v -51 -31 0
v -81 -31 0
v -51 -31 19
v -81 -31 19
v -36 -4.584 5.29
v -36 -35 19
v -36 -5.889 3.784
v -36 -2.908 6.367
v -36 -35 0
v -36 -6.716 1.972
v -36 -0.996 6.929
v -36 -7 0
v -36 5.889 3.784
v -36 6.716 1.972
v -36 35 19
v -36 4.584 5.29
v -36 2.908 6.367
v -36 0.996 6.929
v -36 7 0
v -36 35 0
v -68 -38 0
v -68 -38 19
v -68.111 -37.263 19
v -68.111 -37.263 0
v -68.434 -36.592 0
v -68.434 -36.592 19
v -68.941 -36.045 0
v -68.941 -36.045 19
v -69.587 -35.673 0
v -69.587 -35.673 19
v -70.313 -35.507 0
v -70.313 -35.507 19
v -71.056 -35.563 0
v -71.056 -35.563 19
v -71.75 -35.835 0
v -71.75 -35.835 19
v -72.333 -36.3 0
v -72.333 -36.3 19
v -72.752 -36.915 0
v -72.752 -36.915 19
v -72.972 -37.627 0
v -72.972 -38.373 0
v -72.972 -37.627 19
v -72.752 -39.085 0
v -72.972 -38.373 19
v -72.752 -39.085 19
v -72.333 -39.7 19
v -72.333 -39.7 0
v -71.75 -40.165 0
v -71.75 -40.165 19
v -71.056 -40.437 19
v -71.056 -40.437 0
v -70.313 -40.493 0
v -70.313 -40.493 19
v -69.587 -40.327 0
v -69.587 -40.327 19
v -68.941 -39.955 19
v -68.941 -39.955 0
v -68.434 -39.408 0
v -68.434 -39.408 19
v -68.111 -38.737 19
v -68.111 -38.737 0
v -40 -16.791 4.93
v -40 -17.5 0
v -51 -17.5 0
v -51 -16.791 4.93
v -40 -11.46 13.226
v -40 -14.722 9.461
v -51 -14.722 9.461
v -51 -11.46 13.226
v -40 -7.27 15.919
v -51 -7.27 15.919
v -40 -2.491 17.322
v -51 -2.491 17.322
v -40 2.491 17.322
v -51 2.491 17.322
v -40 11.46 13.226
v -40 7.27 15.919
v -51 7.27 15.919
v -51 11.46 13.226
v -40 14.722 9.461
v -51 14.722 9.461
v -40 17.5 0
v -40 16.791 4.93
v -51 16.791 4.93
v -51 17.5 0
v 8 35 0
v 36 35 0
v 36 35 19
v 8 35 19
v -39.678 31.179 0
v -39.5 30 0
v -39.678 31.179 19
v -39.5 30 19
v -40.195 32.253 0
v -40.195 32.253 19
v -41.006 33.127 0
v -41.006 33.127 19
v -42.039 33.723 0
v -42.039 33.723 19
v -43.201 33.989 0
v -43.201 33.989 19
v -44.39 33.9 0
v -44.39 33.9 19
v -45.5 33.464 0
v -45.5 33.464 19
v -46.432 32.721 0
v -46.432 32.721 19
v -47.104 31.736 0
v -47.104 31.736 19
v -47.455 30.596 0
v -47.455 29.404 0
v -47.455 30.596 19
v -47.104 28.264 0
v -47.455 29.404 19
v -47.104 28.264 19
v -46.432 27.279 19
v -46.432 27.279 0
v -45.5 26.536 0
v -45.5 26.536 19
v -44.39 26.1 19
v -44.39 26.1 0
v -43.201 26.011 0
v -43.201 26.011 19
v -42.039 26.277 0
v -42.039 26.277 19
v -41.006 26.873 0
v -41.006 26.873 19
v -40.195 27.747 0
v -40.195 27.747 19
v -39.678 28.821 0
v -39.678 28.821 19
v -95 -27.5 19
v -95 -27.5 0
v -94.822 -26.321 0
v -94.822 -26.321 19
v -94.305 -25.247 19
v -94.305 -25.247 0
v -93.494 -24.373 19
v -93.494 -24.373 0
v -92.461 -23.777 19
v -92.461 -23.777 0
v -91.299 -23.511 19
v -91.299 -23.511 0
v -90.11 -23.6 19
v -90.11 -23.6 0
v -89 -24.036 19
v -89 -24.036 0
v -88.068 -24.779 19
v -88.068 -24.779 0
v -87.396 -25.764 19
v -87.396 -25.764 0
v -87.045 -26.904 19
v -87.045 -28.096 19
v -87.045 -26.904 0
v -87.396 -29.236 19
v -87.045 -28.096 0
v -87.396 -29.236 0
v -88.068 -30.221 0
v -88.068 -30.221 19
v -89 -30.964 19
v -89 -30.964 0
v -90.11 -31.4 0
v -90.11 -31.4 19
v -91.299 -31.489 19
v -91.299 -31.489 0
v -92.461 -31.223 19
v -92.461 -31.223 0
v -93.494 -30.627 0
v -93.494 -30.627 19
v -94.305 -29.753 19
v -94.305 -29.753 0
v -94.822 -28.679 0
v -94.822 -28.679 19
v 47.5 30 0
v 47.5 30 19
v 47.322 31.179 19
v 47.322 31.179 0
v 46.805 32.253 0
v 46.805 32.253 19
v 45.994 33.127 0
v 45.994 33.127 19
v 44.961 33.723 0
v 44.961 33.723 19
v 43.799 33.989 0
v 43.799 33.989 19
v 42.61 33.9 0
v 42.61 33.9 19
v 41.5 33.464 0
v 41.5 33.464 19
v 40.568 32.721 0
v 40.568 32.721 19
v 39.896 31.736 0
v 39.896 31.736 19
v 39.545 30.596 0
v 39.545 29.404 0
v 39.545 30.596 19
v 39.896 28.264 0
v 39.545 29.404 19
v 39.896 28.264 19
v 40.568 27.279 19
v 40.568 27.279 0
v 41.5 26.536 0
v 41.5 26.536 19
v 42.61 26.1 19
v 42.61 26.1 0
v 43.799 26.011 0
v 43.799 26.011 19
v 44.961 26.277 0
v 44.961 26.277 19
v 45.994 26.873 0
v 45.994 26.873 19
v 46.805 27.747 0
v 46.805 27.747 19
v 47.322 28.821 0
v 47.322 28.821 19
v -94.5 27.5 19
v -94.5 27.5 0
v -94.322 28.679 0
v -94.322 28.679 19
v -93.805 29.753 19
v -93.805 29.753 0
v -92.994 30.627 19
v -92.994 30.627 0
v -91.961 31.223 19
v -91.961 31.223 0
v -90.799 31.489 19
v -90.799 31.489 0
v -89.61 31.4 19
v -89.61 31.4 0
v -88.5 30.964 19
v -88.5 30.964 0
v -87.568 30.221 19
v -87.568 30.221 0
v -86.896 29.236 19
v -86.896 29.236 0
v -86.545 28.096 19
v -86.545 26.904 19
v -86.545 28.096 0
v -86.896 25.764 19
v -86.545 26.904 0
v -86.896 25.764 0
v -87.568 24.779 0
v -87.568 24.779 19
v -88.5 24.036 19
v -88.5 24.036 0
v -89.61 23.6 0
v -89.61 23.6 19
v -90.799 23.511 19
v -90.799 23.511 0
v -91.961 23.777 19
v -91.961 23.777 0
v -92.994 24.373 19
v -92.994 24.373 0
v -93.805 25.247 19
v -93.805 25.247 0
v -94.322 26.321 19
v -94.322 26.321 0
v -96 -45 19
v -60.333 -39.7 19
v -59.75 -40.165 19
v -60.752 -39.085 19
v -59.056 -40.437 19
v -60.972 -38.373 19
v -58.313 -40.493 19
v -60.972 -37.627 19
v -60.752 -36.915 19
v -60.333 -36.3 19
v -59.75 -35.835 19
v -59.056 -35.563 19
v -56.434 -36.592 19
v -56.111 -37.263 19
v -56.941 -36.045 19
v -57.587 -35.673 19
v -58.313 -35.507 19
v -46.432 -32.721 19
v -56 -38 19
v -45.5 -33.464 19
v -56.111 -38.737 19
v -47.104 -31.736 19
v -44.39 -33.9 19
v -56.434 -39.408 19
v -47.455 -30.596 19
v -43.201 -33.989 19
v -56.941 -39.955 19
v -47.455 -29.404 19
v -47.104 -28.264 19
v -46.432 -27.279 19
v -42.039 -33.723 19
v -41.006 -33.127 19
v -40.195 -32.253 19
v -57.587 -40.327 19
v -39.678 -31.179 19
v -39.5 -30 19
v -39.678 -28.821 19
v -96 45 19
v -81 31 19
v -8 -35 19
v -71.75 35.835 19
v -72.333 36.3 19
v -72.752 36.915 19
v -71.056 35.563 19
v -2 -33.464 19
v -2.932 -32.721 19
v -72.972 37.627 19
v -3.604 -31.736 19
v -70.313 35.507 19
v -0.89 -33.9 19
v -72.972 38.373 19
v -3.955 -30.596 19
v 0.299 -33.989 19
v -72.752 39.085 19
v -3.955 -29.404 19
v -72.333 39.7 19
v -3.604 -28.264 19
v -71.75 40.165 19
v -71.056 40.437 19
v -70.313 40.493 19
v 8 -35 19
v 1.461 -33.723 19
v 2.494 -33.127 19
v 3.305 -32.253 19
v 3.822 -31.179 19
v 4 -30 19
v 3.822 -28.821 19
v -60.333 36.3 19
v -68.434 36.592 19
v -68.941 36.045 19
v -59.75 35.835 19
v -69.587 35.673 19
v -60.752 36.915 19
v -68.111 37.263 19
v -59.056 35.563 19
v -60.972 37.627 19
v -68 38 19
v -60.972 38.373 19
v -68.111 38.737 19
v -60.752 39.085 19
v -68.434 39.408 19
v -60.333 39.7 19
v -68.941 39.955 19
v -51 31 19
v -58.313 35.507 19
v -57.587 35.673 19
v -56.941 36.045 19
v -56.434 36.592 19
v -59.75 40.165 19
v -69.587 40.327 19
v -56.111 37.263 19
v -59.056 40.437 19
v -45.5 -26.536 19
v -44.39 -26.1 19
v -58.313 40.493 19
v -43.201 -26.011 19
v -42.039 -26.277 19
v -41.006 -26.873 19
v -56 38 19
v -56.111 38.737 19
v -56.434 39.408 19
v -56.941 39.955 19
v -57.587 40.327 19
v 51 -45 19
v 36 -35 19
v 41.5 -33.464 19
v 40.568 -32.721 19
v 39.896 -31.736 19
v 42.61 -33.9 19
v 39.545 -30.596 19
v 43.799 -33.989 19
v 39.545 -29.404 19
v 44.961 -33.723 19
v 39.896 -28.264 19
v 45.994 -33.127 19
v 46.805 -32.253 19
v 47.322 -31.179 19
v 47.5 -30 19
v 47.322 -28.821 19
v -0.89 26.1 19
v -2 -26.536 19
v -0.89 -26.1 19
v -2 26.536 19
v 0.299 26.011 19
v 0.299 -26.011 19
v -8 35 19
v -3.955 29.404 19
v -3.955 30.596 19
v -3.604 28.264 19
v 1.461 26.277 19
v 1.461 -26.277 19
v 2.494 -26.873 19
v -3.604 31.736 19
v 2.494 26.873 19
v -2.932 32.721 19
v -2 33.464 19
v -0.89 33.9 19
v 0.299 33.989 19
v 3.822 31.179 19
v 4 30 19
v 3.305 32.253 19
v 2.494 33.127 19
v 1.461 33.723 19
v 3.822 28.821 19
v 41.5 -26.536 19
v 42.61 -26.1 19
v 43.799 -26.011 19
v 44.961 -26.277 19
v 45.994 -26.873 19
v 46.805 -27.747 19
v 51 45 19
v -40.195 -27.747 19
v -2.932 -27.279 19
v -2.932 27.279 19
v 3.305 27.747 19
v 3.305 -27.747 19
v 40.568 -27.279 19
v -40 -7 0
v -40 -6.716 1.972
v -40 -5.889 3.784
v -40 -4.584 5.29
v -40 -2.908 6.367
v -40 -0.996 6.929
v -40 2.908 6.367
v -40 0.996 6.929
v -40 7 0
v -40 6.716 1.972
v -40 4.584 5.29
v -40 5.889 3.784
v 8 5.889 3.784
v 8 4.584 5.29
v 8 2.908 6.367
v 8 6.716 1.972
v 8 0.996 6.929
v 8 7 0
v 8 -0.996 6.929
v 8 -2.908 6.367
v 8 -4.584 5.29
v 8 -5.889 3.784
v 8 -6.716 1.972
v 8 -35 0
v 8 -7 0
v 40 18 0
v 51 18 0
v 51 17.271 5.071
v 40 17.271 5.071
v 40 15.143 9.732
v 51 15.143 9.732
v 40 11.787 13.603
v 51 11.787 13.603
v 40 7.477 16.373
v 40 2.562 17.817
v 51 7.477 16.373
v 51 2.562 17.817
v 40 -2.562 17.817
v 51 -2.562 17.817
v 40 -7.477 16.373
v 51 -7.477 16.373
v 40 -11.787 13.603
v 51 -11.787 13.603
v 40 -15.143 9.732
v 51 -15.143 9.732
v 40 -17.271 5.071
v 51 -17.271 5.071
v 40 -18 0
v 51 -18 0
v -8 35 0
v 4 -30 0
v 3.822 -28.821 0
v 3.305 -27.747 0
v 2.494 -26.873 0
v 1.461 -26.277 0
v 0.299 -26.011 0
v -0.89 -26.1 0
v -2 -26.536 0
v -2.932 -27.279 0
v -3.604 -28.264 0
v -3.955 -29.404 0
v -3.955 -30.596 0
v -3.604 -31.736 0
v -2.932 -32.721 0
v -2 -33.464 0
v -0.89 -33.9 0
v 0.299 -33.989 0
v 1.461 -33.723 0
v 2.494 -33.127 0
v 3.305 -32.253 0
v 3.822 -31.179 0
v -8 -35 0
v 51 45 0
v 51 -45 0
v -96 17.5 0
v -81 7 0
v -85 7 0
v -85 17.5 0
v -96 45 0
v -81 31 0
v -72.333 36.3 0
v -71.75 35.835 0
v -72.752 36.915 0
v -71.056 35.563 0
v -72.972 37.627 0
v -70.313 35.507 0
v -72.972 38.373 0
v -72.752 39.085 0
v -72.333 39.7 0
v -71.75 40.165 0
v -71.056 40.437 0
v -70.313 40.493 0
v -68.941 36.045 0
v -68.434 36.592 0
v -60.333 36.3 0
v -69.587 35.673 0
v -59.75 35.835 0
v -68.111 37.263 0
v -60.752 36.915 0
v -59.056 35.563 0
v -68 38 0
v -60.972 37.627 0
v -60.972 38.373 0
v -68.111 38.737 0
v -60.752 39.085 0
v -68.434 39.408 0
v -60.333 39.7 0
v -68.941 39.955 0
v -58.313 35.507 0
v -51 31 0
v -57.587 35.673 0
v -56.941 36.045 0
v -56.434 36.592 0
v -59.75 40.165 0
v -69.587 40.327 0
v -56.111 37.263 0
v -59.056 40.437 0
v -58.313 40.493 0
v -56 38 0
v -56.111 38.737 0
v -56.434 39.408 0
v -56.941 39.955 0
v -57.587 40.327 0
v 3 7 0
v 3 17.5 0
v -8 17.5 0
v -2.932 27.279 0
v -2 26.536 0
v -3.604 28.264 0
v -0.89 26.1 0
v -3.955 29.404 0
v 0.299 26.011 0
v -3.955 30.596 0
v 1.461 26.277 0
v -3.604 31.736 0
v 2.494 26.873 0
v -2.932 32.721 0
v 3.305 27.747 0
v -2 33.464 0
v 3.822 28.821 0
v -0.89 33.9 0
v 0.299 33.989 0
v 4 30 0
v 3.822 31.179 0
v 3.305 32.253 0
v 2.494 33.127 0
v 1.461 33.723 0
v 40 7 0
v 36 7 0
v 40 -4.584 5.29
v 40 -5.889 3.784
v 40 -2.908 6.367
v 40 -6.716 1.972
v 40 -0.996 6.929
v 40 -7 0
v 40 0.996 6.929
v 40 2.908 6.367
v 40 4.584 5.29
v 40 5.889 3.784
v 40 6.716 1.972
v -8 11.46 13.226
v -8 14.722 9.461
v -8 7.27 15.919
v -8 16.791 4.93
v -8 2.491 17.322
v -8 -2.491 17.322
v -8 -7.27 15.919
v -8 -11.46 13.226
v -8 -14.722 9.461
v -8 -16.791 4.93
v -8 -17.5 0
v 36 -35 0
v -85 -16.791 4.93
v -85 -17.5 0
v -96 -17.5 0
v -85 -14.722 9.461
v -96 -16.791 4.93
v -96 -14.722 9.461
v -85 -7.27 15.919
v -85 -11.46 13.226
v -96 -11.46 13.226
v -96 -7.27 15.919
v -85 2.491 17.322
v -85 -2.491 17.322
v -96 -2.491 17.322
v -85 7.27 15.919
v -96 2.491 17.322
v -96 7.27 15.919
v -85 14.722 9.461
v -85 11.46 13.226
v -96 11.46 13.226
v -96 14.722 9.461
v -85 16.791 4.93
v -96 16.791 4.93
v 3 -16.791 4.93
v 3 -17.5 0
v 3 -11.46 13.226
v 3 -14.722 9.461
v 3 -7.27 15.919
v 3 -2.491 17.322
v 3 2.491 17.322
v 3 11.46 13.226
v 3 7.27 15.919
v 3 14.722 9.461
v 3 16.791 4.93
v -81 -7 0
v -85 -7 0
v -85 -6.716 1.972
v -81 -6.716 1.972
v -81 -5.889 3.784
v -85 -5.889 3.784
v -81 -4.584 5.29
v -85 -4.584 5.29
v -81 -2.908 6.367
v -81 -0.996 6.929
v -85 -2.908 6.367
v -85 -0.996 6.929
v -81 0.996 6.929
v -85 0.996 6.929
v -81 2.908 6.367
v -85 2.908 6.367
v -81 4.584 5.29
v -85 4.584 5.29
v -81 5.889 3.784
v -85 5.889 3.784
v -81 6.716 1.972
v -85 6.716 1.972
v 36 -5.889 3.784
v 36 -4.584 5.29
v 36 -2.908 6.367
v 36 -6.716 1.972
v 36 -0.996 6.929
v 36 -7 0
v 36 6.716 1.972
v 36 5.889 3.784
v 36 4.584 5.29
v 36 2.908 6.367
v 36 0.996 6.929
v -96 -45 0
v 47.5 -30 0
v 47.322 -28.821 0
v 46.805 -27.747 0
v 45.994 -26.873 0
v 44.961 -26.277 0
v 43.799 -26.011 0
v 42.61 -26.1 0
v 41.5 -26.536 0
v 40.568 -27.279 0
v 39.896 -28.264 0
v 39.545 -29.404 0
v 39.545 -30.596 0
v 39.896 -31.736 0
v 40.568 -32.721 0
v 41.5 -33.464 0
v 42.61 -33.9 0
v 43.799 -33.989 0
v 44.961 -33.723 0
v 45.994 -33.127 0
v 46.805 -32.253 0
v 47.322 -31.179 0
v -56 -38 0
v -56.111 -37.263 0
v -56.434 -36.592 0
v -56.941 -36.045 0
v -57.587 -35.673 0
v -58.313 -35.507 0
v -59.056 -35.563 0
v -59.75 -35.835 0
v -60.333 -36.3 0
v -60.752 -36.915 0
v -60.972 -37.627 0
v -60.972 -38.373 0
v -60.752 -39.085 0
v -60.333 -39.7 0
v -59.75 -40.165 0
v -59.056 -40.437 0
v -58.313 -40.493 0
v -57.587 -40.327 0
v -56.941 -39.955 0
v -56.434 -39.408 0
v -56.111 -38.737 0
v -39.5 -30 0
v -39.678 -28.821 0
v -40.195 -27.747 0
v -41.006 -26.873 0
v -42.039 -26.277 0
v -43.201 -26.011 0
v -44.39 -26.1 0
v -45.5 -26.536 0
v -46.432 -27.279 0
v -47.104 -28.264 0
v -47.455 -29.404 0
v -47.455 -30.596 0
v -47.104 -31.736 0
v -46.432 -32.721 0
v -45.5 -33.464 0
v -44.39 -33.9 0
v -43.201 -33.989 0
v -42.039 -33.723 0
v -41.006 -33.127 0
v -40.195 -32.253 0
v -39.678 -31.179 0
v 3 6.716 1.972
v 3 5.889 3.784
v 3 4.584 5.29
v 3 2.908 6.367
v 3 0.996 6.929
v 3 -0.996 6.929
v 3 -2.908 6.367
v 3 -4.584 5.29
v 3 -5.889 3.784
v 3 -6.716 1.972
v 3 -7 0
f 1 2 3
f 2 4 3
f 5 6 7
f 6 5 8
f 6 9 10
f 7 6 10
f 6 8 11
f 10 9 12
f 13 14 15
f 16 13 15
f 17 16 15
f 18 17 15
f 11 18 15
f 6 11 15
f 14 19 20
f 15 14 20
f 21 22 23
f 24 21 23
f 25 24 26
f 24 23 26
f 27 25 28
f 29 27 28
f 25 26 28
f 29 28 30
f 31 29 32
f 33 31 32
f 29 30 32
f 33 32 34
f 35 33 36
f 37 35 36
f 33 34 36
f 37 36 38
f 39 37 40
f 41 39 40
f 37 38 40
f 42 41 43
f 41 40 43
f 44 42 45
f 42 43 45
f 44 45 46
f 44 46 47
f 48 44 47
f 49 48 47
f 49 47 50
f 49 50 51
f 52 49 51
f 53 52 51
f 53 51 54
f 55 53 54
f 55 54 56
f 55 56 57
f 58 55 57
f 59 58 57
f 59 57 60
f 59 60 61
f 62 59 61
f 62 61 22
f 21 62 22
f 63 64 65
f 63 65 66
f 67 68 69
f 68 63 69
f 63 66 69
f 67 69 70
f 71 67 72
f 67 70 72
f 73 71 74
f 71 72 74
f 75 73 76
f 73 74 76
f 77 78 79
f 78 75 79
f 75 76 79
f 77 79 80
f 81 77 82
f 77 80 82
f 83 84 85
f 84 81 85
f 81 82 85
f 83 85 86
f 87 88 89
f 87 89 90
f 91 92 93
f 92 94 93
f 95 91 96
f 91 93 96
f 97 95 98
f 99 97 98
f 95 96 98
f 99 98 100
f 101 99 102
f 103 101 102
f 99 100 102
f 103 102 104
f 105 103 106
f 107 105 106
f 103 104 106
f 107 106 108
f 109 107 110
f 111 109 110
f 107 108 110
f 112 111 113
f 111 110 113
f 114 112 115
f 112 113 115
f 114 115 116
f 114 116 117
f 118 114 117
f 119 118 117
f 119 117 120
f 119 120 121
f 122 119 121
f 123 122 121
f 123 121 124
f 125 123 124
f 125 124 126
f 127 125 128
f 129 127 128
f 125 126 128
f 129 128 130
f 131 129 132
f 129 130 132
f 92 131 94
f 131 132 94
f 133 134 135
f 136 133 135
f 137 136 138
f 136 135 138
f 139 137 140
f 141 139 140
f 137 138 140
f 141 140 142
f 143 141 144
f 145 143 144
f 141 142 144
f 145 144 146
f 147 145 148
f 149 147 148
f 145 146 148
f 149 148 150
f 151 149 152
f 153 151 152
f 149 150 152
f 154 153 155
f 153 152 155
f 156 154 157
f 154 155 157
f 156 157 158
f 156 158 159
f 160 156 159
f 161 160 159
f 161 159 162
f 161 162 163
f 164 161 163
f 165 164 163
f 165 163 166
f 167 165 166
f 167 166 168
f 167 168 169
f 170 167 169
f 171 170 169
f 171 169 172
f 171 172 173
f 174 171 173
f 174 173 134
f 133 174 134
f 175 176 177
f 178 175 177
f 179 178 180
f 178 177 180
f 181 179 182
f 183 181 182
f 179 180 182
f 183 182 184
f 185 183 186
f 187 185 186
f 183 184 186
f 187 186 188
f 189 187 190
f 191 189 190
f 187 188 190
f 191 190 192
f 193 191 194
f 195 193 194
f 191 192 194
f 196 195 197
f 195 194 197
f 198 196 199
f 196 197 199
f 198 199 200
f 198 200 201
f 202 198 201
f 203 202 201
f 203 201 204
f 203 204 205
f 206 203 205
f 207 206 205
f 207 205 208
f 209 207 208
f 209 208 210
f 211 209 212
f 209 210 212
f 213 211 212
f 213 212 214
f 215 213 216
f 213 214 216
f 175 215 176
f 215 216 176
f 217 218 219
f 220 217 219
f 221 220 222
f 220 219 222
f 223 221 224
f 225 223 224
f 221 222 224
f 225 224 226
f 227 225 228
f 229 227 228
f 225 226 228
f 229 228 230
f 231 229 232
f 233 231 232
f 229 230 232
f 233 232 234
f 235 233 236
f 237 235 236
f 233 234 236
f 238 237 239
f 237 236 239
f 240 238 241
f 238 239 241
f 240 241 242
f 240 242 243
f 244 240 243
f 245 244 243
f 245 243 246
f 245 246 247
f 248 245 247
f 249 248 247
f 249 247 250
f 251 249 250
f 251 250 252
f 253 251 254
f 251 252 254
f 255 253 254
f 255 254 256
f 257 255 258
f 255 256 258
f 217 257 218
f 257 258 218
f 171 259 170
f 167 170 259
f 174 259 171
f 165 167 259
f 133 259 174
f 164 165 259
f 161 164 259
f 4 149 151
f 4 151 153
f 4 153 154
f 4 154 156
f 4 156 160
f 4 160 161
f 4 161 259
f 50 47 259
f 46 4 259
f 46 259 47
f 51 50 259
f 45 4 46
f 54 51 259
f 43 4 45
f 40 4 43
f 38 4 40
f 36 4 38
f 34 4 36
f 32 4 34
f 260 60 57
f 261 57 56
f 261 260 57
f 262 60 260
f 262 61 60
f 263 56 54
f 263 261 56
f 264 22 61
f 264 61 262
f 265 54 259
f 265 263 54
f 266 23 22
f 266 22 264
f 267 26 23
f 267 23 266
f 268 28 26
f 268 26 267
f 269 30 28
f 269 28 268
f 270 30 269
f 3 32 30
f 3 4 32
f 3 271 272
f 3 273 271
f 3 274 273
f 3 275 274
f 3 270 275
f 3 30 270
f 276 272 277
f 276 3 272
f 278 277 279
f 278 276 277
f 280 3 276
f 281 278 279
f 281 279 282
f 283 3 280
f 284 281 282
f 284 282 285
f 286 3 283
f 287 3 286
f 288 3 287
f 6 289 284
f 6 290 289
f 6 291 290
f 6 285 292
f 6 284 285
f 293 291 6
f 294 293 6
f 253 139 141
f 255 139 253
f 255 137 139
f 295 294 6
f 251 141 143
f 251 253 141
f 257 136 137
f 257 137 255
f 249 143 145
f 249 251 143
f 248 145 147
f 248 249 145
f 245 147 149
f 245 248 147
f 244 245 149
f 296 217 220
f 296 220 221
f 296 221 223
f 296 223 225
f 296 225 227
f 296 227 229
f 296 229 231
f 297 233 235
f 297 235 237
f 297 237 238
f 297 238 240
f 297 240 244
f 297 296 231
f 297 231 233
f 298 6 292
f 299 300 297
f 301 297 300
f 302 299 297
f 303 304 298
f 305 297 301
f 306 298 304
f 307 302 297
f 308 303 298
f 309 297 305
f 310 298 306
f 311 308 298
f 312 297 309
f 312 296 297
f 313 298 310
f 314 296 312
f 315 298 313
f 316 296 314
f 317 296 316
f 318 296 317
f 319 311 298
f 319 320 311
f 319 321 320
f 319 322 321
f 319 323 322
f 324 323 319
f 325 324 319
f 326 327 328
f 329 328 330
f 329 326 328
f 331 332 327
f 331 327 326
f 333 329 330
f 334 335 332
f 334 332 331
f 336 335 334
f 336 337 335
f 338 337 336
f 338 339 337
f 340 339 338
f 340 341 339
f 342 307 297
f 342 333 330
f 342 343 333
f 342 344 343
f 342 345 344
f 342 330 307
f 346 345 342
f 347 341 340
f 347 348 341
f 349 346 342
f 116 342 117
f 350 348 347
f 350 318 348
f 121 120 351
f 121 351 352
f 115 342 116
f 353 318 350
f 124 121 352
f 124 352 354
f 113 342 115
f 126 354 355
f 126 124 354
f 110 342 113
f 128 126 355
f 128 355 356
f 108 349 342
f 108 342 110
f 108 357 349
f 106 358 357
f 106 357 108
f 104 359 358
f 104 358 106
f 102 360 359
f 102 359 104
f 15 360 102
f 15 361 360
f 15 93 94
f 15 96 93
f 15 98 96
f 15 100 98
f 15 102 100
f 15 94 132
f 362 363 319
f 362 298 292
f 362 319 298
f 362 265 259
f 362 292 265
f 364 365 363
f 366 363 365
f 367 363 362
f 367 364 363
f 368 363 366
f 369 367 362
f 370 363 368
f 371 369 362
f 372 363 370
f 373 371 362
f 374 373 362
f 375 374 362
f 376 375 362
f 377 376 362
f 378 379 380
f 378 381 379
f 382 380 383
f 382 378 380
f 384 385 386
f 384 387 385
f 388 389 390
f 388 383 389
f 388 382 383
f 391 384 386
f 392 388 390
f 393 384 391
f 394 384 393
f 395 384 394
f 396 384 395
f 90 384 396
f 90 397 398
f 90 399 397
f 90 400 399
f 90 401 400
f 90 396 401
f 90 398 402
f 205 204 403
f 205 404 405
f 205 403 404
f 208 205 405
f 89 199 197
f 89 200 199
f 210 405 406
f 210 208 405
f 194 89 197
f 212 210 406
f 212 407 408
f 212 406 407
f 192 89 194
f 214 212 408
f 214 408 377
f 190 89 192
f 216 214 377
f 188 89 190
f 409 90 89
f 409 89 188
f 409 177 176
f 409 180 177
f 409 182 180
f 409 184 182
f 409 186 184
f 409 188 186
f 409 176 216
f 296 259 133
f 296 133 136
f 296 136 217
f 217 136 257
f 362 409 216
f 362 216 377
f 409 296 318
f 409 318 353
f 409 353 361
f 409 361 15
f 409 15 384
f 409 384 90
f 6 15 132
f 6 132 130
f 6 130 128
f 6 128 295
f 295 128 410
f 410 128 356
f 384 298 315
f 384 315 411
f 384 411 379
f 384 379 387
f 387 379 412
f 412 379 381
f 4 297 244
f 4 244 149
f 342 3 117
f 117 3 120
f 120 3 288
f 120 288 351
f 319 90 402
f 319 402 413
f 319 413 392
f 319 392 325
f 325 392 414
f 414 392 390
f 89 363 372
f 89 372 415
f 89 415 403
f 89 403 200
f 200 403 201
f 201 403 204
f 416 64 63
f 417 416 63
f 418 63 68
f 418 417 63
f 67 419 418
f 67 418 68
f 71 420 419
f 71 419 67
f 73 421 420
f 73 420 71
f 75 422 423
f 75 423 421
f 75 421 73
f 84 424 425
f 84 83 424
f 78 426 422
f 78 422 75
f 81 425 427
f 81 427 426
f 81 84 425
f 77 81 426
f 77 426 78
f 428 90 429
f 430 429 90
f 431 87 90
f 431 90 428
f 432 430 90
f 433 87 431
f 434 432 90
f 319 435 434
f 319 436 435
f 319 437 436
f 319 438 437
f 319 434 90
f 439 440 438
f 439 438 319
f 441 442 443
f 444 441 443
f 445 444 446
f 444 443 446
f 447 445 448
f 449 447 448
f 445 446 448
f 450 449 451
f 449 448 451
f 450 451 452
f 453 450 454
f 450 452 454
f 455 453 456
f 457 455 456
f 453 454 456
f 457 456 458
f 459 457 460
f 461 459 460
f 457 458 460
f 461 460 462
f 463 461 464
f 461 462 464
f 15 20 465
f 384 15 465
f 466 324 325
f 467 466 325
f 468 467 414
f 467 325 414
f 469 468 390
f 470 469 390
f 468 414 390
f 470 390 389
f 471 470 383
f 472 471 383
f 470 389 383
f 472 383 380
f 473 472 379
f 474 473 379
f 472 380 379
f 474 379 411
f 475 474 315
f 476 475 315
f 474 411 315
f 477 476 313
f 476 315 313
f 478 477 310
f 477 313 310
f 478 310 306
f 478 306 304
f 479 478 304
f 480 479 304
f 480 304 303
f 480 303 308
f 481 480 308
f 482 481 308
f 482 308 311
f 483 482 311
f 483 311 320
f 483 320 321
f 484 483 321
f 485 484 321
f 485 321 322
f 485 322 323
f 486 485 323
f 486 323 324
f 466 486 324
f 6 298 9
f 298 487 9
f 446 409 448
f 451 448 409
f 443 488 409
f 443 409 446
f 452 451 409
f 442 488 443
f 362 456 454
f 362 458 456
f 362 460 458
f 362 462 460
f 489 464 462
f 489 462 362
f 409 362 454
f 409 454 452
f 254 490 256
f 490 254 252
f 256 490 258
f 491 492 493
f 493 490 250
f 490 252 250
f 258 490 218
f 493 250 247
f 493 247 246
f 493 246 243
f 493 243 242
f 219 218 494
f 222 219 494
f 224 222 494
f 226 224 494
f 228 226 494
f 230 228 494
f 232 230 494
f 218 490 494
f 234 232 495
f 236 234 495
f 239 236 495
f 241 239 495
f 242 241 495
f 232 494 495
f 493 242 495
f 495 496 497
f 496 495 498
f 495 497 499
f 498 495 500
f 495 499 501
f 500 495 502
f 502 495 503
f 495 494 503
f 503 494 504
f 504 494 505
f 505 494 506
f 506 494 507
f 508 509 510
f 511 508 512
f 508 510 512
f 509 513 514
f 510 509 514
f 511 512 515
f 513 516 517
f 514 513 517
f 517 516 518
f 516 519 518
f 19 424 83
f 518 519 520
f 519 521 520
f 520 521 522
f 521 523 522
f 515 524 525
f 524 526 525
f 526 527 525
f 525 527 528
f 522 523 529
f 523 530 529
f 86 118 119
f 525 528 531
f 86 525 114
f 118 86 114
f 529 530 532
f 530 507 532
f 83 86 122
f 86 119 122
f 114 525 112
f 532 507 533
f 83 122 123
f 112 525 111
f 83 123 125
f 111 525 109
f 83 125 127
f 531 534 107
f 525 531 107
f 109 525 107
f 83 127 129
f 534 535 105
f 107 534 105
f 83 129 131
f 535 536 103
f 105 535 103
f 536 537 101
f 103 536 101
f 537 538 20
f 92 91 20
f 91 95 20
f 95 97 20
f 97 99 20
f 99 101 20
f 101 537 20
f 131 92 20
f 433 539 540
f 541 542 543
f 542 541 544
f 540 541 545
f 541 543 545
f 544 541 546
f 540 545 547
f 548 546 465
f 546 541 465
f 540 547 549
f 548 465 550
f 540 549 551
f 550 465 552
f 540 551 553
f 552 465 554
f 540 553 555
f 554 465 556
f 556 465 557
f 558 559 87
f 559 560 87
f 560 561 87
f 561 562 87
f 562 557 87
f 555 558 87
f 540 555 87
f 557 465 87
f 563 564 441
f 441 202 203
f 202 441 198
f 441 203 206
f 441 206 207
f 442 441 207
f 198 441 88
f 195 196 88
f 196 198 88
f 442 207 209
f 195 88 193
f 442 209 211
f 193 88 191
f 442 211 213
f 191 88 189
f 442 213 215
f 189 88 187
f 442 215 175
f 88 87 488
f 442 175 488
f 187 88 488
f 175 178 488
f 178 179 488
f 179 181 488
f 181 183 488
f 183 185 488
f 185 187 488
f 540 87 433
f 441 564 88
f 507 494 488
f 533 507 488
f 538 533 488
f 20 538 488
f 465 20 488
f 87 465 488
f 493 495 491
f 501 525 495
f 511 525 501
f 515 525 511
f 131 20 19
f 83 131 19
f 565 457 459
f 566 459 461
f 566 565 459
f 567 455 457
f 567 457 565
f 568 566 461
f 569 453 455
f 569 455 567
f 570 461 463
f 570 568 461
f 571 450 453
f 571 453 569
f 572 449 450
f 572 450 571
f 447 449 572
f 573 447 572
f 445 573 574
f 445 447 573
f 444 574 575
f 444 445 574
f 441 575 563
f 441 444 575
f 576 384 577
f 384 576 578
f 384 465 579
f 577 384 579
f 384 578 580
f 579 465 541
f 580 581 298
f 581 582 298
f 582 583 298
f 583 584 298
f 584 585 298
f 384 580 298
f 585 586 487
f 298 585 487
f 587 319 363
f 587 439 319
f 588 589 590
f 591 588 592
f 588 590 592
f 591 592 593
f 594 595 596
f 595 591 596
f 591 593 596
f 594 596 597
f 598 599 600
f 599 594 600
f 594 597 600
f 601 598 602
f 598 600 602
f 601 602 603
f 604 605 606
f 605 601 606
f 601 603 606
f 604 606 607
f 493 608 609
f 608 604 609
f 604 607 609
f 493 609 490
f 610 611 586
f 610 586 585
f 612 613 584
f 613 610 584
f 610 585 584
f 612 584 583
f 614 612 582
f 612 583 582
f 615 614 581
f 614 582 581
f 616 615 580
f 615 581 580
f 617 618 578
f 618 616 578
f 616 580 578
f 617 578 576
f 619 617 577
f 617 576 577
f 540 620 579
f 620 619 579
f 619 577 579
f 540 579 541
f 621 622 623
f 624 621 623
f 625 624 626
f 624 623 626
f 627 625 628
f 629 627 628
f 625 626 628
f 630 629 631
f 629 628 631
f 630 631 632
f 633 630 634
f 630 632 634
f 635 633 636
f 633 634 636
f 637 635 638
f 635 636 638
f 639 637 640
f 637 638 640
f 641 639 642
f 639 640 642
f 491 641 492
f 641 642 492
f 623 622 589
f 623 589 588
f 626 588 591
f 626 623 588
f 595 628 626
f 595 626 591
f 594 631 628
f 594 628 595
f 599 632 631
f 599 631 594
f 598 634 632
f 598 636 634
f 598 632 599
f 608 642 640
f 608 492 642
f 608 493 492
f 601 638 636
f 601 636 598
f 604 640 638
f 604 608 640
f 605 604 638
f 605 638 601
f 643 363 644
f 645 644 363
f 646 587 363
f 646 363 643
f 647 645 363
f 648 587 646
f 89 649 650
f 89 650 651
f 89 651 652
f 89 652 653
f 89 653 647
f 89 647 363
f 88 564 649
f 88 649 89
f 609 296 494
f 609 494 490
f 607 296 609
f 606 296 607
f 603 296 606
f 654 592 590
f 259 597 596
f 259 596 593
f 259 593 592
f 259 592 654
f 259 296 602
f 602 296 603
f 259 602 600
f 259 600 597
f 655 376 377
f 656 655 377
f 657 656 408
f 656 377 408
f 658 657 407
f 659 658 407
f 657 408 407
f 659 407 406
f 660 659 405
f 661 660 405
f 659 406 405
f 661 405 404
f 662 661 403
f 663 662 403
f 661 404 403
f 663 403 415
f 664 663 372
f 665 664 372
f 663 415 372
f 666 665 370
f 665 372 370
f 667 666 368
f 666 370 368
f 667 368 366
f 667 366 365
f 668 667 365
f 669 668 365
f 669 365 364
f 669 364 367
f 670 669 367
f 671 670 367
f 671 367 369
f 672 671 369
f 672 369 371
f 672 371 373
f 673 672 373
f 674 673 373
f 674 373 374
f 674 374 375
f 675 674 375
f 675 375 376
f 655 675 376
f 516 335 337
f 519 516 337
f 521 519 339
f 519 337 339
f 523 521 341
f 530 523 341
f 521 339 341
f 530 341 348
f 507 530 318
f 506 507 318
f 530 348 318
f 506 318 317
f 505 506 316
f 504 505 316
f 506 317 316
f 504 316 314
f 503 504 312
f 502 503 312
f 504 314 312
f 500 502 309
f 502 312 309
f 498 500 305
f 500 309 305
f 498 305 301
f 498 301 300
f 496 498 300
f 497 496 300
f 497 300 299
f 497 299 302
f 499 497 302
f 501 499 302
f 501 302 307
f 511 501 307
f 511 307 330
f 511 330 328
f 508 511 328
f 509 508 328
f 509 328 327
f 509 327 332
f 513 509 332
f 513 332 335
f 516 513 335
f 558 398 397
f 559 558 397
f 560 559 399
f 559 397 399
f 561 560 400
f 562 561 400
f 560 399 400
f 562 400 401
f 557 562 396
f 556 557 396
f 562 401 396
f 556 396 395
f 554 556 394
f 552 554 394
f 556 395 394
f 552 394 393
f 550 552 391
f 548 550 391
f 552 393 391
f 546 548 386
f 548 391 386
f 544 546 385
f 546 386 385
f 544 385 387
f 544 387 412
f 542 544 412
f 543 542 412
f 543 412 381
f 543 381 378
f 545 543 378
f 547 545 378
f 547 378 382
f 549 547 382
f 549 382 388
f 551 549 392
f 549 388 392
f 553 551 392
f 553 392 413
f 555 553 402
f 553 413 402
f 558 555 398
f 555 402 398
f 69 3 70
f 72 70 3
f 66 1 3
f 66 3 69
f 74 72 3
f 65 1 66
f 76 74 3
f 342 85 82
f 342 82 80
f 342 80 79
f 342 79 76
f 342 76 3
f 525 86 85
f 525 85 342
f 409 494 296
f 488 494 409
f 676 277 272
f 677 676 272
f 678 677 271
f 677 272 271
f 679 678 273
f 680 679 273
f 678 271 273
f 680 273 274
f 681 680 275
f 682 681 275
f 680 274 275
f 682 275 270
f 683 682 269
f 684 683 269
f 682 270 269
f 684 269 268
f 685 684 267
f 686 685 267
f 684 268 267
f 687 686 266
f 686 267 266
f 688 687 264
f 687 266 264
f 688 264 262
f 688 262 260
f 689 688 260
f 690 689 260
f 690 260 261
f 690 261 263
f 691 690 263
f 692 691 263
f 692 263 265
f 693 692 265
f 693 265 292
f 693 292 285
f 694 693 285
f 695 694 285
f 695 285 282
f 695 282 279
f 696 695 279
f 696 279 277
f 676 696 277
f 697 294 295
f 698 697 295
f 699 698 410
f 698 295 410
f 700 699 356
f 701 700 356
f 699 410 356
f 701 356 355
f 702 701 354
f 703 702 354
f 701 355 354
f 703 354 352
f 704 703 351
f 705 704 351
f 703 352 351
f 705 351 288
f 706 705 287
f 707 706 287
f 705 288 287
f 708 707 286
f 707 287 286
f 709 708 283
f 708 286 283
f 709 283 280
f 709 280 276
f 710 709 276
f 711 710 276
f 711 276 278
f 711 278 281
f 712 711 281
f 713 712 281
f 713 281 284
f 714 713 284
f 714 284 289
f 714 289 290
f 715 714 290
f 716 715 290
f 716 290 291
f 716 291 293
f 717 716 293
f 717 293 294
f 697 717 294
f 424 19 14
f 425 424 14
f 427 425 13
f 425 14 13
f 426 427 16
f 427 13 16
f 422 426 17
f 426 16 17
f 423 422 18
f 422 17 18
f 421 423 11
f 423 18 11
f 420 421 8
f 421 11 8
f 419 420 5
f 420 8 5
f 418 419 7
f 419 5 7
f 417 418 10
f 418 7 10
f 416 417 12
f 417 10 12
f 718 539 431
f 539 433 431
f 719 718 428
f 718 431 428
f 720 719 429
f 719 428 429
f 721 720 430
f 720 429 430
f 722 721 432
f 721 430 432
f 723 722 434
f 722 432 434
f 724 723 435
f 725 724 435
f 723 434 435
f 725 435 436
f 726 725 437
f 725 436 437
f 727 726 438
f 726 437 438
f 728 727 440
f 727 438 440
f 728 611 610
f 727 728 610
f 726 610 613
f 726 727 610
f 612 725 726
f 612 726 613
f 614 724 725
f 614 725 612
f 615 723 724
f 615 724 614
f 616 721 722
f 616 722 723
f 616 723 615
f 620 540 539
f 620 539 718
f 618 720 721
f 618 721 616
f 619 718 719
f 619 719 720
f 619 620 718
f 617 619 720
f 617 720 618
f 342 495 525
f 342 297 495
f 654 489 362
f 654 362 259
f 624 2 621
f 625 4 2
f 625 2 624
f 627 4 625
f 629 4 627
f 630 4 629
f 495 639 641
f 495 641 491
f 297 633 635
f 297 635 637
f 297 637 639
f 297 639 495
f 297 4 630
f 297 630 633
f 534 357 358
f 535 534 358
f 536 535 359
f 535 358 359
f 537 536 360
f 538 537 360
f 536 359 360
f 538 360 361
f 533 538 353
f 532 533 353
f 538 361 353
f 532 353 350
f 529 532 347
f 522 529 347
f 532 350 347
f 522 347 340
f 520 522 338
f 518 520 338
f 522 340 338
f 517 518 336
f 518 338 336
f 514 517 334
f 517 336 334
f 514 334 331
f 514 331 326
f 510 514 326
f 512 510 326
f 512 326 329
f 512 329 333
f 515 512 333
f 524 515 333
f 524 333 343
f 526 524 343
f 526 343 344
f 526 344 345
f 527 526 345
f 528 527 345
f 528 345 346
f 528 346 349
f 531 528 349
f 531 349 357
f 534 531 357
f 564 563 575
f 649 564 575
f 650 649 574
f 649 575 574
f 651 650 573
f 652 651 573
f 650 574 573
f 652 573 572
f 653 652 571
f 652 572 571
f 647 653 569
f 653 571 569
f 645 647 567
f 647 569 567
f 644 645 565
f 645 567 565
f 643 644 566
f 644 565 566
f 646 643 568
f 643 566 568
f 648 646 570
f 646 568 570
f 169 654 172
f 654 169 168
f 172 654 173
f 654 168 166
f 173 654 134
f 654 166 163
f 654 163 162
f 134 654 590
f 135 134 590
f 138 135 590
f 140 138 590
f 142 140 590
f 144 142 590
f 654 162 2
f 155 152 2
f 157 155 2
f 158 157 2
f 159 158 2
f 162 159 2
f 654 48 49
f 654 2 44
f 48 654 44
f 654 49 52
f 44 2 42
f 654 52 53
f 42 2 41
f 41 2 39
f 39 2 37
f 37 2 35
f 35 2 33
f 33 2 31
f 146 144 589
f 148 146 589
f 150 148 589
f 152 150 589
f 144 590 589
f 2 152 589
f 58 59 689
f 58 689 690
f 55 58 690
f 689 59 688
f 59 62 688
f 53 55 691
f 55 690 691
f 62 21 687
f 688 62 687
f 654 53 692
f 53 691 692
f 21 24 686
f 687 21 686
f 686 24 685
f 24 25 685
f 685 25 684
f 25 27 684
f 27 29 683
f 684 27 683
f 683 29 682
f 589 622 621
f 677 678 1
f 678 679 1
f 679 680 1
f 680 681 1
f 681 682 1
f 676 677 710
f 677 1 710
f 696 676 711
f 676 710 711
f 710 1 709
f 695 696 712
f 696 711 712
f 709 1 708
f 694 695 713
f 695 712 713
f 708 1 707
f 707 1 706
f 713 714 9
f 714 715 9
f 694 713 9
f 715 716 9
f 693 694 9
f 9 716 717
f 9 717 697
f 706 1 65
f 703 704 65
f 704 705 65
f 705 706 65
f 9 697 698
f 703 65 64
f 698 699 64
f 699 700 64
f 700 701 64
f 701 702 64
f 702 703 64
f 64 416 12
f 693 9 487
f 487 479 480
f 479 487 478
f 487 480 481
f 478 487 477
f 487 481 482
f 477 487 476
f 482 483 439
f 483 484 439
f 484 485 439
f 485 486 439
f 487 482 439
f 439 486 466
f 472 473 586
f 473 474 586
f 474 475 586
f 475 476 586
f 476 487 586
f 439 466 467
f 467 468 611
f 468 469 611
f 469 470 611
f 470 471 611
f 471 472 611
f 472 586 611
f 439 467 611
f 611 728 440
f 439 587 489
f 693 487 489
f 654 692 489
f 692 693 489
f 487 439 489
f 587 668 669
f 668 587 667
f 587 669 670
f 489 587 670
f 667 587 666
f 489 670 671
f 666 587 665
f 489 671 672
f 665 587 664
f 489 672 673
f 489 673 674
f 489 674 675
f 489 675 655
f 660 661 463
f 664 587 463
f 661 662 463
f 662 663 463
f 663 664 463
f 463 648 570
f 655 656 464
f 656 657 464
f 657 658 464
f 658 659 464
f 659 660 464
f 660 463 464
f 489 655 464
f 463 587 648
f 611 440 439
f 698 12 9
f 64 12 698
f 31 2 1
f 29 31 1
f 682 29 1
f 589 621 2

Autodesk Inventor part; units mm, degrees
ref_plane "YZ Plane" through (0, 0, 0) normal (1, 0, 0) x (0, 1, 0)
ref_plane "XZ Plane" through (0, 0, 0) normal (0, 1, 0) x (-1, 0, 0)
ref_plane "XY Plane" through (0, 0, 0) normal (0, 0, 1) x (1, 0, 0)
sketch "Sketch1" plane through (0, 0, 0) normal (0, 0, 1) x (1, 0, 0)
  line L0 (51, -45) -> (-51, -45)
  line L1 (-51, -45) -> (-51, 45)
  line L2 (-51, 45) -> (51, 45)
  line L3 (51, 45) -> (51, -45)
  line L4 (51, -45) -> (-51, 45) construction
  line L5 (-51, -45) -> (51, 45) construction
  line L6 (-22, 0) -> (22, 0) construction
  line L7 (-36, 35) -> (-8, 35)
  line L8 (-8, 35) -> (-8, -35)
  line L9 (-8, -35) -> (-36, -35)
  line L10 (-36, -35) -> (-36, 35)
  line L11 (-36, 35) -> (-8, -35) construction
  line L12 (-8, 35) -> (-36, -35) construction
  line L13 (36, 35) -> (8, 35)
  line L14 (8, 35) -> (8, -35)
  line L15 (8, -35) -> (36, -35)
  line L16 (36, -35) -> (36, 35)
  line L17 (36, 35) -> (8, -35) construction
  line L18 (8, 35) -> (36, -35) construction
  point P0 (0, 0)
  point P1 (0, 0)
  dimension "d0" = 16
  dimension "d1" = 28
  dimension "d2" = 28
  dimension "d3" = 70
  dimension "d4" = 10
  dimension "d5" = 15
extrude "Extrusion1" add sketch "Sketch1" along normal blind 19
sketch "Sketch2" plane through (51, -45, 0) normal (1, 0, 0) x (0, 0, -1)
  circle A0 centre (0, 45) radius 7
  point P0 (0, 45)
  dimension "d8" = 14
extrude "Extrusion2" cut sketch "Sketch2" against normal through all
sketch "Sketch3" plane through (51, -45, 19) normal (1, 0, 0) x (0, 0, -1)
  arc A0 (19, 52) -> (19, 38) centre (19, 45) ccw projected
  circle A1 centre (19, 45) radius 18
  dimension "d11" = 36
extrude "Extrusion3" cut sketch "Sketch3" against normal blind 11
sketch "Sketch4" plane through (-51, -45, 19) normal (-1, 0, 0) x (0, 0, 1)
  arc A0 (-19, 38) -> (-19, 52) centre (-19, 45) ccw projected
  circle A1 centre (-19, 45) radius 17.5
  dimension "d14" = 35
extrude "Extrusion4" cut sketch "Sketch4" against normal blind 11
sketch "Sketch5" plane through (-8, -35, 19) normal (-1, 0, 0) x (0, 0, 1)
  arc A0 (-19, 28) -> (-19, 42) centre (-19, 35) ccw projected
  circle A1 centre (-19, 35) radius 17.5
  dimension "d17" = 35
extrude "Extrusion5" cut sketch "Sketch5" against normal blind 11
sketch "Sketch6" plane through (8, -35, 19) normal (1, 0, 0) x (0, 0, -1)
  arc A0 (19, 42) -> (19, 28) centre (19, 35) ccw projected
  circle A1 centre (19, 35) radius 17.5
  dimension "d20" = 35
extrude "Extrusion6" [suppressed]
sketch "Sketch7" plane through (0, 0, 19) normal (0, 0, 1) x (1, 0, 0)
  line L0 (-36, -35) -> (-36, 35) projected
  line L1 (-51, 45) -> (-51, -45) projected
  line L2 (0, 30) -> (0, -30) construction
  circle A0 centre (0, 30) radius 4
  circle A1 centre (0, -30) radius 4
  line L3 (43.5, -30) -> (-43.5, -30) construction
  line L4 (-43.5, -30) -> (-43.5, 30) construction
  line L5 (-43.5, 30) -> (43.5, 30) construction
  line L6 (43.5, 30) -> (43.5, -30) construction
  line L7 (43.5, -30) -> (-43.5, 30) construction
  line L8 (-43.5, -30) -> (43.5, 30) construction
  circle A2 centre (-43.5, 30) radius 4
  circle A3 centre (-43.5, -30) radius 4
  circle A4 centre (43.5, -30) radius 4
  circle A5 centre (43.5, 30) radius 4
  point P0 (0, 0)
  point P1 (0, 0)
  dimension "d23" = 60
  dimension "d24" = 8
  dimension "d25" = 7.5
  dimension "d26" = 87
extrude "Extrusion7" cut sketch "Sketch7" against normal through all
sketch "Sketch8" plane through (0, 0, 19) normal (0, 0, 1) x (1, 0, 0)
  line L0 (-51, 45) -> (-81, 45)
  line L1 (-81, 45) -> (-81, 31)
  line L2 (-81, 31) -> (-51, 31)
  line L3 (-51, 31) -> (-51, 45)
  line L4 (-51, -45) -> (-81, -45)
  line L5 (-81, -45) -> (-81, -31)
  line L6 (-81, -31) -> (-51, -31)
  line L7 (-51, -31) -> (-51, -45)
  line L8 (-81, 45) -> (-96, 45)
  line L9 (-96, 45) -> (-96, -45)
  line L10 (-96, -45) -> (-81, -45)
  line L11 (-81, -45) -> (-81, 45)
  point P0 (0, 0)
  dimension "d29" = 14
  dimension "d30" = 15
  dimension "d31" = 30
  dimension "d41" = 31
extrude "Extrusion8" add sketch "Sketch8" against normal up to surface (19 mm away)
sketch "Sketch9" plane through (-96, -45, 19) normal (-1, 0, 0) x (0, 0, 1)
  circle A0 centre (-19, 45) radius 17.5
  dimension "d34" = 35
extrude "Extrusion9" cut sketch "Sketch9" against normal blind 11
sketch "Sketch10" plane through (0, 0, 0) normal (0, 0, -1) x (-1, 0, 0)
  line L0 (96, -17.5) -> (85, -17.5) projected
  circle A0 centre (43.5, 30) radius 4 projected
  circle A1 centre (0, 30) radius 4 projected
  circle A2 centre (-43.5, 30) radius 4 projected
  line L1 (85, 17.5) -> (96, 17.5) projected
  line L2 (96, 17.5) -> (96, 45) projected
  line L3 (96, 45) -> (-51, 45) projected
  line L4 (-51, 45) -> (-51, 18) projected
  line L5 (-51, 18) -> (-40, 18) projected
  line L6 (-40, 18) -> (-40, 7) projected
  line L7 (-40, 7) -> (-36, 7) projected
  line L8 (-36, 7) -> (-36, 35) projected
  line L9 (-36, 35) -> (-8, 35) projected
  line L10 (-8, -7) -> (-8, -35) projected
  line L11 (36, 7) -> (40, 7) projected
  line L12 (-3, 7) -> (-3, 17.5) projected
  line L13 (-3, 17.5) -> (8, 17.5) projected
  line L14 (8, 17.5) -> (8, 35) projected
  line L15 (8, 35) -> (36, 35) projected
  line L16 (36, 35) -> (36, 7) projected
  line L17 (40, 7) -> (40, 17.5) projected
  line L18 (40, 17.5) -> (51, 17.5) projected
  line L19 (51, 17.5) -> (51, 31) projected
  line L20 (51, 31) -> (81, 31) projected
  line L21 (81, 31) -> (81, -31) projected
  line L22 (90.5, 17.5) -> (90.5, 27.5) construction
  line L23 (91, -17.5) -> (91, -27.5) construction
  circle A3 centre (90.5, 27.5) radius 4
  circle A4 centre (91, -27.5) radius 4
  line L24 (96, -17.5) -> (85, -17.5) projected
  line L25 (81, -31) -> (51, -31) projected
  line L26 (51, -31) -> (51, -17.5) projected
  line L27 (51, -17.5) -> (40, -17.5) projected
  line L28 (40, -17.5) -> (40, -7) projected
  line L29 (40, -7) -> (36, -7) projected
  line L30 (36, -7) -> (36, -35) projected
  line L31 (36, -35) -> (8, -35) projected
  line L32 (8, -35) -> (8, -17.5) projected
  line L33 (8, -17.5) -> (-3, -17.5) projected
  line L34 (-3, -17.5) -> (-3, -7) projected
  line L35 (-3, -7) -> (-8, -7) projected
  line L36 (-8, -35) -> (-36, -35) projected
  line L37 (-36, -35) -> (-36, -7) projected
  line L38 (-36, -7) -> (-40, -7) projected
  line L39 (-40, -7) -> (-40, -18) projected
  line L40 (-40, -18) -> (-51, -18) projected
  line L41 (-51, -18) -> (-51, -45) projected
  line L42 (-51, -45) -> (96, -45) projected
  line L43 (96, -45) -> (96, -17.5) projected
  line L44 (-8, 35) -> (-8, 7) projected
  line L45 (-8, 7) -> (-3, 7) projected
  line L46 (85, -17.5) -> (85, 17.5) projected
  point P0 (86, -17.5)
  point P1 (0, 0)
  dimension "d37" = 8
  dimension "d38" = 10
extrude "Extrusion10" cut sketch "Sketch10" against normal through all contours A3 | A4
sketch "Sketch11" plane through (0, 0, 19) normal (0, 0, 1) x (1, 0, 0)
  circle A0 centre (-58.5, 38) radius 2.5 projected
  circle A1 centre (-70.5, 38) radius 2.5 projected
  circle A2 centre (-70.5, -38) radius 2.5 projected
  circle A3 centre (-58.5, -38) radius 2.5 projected
  point P0 (0, 0)
extrude "Extrusion11" cut sketch "Sketch11" against normal through all
sketch "Sketch12" plane through (-85, -45, 19) normal (-1, 0, 0) x (0, 0, 1)
  arc A0 (-19, 38) -> (-19, 52) centre (-19, 45) ccw projected
  line L0 (-19, 52) -> (-19, 38)
  line L1 (-19, 27.5) -> (-19, 62.5) projected
  point P0 (-19, 45)
extrude "Extrusion12" cut sketch "Sketch12" against normal blind 10
properties part number "frame 1"
